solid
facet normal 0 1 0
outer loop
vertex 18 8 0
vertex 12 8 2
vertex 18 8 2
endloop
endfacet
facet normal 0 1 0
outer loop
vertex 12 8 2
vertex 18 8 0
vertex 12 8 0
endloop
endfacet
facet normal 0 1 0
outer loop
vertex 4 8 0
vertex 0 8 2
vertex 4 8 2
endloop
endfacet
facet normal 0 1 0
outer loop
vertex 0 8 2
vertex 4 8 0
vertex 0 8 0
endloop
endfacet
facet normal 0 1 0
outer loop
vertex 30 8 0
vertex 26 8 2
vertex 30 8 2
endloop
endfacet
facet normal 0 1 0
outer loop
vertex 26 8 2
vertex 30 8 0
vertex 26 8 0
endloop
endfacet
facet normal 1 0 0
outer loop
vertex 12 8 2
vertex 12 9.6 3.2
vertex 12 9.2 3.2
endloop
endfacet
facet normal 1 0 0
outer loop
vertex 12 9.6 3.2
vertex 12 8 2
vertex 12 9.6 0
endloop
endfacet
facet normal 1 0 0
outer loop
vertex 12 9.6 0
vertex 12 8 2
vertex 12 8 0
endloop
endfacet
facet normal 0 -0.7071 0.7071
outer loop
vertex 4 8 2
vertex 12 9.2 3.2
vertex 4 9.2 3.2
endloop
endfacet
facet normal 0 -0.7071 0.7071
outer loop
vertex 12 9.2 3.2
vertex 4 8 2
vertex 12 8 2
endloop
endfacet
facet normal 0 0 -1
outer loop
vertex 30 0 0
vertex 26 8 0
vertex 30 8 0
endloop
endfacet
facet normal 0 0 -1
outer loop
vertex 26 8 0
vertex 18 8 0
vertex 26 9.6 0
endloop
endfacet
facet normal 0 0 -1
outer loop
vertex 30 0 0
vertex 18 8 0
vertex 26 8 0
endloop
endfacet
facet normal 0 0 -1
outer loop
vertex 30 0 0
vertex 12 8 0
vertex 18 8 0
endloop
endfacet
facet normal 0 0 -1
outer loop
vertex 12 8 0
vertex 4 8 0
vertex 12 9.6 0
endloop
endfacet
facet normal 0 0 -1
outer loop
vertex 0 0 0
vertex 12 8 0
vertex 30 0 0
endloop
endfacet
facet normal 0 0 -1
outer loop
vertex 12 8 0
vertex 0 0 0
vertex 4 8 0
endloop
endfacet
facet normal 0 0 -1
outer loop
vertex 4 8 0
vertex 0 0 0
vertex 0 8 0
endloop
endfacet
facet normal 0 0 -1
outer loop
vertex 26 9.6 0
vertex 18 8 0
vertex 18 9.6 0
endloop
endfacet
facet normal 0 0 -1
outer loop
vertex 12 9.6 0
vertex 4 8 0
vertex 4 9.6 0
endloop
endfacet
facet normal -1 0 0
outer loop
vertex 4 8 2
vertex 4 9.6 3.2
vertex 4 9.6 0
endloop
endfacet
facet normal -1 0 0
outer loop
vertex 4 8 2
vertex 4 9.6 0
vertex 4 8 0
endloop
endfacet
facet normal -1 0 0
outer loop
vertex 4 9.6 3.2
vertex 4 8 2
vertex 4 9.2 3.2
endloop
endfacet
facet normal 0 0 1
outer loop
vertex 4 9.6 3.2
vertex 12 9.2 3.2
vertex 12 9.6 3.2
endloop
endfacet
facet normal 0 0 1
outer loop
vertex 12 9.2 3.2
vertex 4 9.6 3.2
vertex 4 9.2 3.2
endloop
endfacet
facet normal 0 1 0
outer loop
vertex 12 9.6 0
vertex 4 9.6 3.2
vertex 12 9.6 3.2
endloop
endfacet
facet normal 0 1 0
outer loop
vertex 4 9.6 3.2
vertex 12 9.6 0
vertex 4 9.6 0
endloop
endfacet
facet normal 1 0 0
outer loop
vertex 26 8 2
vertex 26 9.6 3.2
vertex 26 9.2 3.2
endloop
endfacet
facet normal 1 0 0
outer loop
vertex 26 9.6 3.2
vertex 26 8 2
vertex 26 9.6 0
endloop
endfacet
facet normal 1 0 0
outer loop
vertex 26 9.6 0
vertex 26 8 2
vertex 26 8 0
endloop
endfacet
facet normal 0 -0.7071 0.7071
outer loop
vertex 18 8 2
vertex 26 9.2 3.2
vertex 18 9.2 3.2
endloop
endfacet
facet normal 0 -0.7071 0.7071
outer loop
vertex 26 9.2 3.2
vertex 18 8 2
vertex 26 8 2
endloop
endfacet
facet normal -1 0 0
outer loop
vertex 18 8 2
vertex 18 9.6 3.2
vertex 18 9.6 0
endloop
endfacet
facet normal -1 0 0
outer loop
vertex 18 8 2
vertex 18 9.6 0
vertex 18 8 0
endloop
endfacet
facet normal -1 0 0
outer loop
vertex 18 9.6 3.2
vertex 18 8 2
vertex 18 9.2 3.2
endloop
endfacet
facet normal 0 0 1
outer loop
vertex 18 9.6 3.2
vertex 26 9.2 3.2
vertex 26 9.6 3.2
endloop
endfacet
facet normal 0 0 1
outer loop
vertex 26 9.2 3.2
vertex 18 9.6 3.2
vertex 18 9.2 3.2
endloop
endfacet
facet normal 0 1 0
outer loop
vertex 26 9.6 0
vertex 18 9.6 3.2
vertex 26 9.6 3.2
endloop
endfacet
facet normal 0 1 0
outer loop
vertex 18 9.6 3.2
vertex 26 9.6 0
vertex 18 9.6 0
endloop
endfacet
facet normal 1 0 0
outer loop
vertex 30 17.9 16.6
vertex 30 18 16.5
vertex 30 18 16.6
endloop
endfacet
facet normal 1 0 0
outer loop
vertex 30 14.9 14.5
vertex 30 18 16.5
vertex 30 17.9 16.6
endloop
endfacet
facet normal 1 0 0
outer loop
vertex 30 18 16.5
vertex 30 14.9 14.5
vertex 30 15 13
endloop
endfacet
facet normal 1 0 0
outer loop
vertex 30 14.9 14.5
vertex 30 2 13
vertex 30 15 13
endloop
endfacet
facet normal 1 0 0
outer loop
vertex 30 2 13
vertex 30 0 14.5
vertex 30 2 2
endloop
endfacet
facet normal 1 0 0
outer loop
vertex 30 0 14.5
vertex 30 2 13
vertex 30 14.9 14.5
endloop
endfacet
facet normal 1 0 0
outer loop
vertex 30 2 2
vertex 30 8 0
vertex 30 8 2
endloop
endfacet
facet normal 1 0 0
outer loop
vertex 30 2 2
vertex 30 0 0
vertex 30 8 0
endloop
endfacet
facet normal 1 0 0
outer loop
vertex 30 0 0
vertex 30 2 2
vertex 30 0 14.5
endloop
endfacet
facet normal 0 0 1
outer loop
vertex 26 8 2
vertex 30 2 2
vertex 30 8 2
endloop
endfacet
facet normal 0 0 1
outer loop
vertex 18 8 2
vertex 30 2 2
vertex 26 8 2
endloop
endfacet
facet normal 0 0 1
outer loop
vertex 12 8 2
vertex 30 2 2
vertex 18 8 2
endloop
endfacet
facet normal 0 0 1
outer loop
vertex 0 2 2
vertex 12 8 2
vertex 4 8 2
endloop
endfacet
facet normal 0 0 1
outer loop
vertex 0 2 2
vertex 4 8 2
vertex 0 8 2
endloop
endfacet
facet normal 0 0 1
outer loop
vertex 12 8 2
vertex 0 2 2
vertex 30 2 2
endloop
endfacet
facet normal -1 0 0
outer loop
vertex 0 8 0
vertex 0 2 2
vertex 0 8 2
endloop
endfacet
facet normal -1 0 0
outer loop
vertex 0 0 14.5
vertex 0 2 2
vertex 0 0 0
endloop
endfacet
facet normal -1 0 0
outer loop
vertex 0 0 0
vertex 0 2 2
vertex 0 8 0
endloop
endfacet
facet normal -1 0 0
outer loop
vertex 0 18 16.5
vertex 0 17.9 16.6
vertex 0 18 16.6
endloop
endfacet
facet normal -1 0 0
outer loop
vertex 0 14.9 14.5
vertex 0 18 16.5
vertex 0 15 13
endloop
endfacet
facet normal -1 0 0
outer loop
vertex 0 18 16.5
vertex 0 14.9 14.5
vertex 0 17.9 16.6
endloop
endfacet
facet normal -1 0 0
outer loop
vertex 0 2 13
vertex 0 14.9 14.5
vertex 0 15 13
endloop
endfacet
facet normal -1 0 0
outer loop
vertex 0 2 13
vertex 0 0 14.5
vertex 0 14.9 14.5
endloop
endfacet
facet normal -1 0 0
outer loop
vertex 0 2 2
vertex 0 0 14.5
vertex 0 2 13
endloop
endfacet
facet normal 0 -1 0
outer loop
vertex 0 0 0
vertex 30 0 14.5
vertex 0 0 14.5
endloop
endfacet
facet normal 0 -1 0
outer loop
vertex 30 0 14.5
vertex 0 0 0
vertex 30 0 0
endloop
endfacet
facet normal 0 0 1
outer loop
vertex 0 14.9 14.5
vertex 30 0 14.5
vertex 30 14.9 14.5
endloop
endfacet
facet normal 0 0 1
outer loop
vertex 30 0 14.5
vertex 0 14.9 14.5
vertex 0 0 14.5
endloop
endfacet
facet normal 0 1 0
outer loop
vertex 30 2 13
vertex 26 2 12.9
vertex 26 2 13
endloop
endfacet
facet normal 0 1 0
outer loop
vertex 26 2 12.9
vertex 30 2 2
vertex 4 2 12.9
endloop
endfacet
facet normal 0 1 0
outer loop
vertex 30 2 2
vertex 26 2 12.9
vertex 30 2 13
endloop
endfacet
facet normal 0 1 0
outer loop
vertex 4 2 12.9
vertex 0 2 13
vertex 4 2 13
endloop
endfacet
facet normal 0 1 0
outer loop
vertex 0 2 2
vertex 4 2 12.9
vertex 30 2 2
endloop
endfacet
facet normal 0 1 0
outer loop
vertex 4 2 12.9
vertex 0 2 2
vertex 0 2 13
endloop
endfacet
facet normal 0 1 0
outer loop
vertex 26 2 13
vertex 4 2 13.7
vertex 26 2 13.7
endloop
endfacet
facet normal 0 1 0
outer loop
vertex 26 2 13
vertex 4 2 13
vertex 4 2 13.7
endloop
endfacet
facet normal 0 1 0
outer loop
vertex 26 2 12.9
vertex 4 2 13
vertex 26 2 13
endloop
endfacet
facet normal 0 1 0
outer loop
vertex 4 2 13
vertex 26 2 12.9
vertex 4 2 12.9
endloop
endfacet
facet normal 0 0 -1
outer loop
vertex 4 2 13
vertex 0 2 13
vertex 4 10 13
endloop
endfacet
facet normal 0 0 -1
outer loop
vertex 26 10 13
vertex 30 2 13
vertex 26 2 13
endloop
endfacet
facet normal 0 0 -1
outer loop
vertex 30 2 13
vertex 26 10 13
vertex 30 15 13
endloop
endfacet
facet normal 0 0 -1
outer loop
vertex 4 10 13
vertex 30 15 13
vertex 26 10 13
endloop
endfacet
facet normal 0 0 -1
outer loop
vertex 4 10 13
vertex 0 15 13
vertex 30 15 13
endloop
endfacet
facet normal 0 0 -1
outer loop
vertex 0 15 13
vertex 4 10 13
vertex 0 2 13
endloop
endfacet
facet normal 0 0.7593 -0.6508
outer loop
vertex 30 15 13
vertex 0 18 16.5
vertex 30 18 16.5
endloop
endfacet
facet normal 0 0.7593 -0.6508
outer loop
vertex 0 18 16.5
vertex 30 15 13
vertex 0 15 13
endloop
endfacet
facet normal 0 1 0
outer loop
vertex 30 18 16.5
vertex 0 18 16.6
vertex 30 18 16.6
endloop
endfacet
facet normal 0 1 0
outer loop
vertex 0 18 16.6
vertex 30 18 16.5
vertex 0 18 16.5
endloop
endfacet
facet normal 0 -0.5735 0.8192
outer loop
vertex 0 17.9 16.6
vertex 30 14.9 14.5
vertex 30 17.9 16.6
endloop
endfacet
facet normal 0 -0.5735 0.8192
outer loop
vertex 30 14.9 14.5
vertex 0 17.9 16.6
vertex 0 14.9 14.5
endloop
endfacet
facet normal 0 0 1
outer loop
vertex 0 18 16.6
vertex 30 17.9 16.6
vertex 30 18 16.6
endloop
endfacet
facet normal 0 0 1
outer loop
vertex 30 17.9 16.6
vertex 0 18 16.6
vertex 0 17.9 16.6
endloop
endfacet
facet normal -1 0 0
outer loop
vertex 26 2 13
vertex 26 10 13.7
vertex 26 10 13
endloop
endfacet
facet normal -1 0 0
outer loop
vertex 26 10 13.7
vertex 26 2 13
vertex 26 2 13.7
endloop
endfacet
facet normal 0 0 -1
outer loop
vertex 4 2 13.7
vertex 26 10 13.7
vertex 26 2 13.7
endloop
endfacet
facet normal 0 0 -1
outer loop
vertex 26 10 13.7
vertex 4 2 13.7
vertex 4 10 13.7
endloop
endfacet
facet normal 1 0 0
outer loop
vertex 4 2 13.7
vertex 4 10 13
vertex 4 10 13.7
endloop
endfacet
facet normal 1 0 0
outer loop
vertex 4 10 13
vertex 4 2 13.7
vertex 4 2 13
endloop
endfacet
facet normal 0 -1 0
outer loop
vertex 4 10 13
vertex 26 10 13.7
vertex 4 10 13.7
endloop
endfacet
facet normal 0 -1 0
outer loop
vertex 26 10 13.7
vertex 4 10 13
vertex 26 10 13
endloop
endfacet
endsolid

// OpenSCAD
// ============================================================
// CLIP DE RETENÇÃO PARA MANTA G3
// Impressão 3D - PLA/PETG (Ender 3)
// ============================================================
//
// CONCEITO: Clips que prendem a manta G3 (10mm) na borda
// do furo 200×200mm do MDF da divisória.
//
// O clip abraça a borda do MDF (3mm) e tem uma aba que
// pressiona a manta contra o MDF. Para trocar a manta:
// aperta a lingueta flexível e puxa o clip.
//
// FIXAÇÃO: O clip tem 2 dentes snap-fit que passam por
// slots cortados no MDF na borda do furo.
//
// QUANTIDADE: 8 clips (2 por lado do furo)
//
// VISTA LATERAL (corte):
//
//   ┌── aba retenção (prensa manta) ──┐
//   │         manta G3 10mm           │
//   ╞═══MDF══[entalhe]════════════════╡  ← entalhe 30×2mm no MDF
//            │  base (sob o MDF)       │
//            └── dente ────── dente ───┘
//
// SEÇÃO DO CLIP:
//   Topo: aba 15mm sobre a manta (prensa para baixo)
//   Meio: parede (2mm) passa pelo entalhe na borda do furo
//   Base: 8mm por baixo do MDF com dentes snap-fit
//
// MONTAGEM:
//   1. Incline o clip pela abertura do furo
//   2. Deslize a base por baixo do MDF (área sólida)
//   3. A parede passa pelo entalhe 30×2mm na borda
//   4. Dentes clicam nos slots do MDF
//   5. Aba prensa a manta por cima
//
// ============================================================

// === PARÂMETROS ===
mdf = 3;            // Espessura MDF
folga = 0.3;        // Folga de encaixe
manta_esp = 10;     // Espessura da manta G3

// Clip
clip_larg = 30;     // Largura do clip ao longo da borda
clip_parede = 2;    // Espessura das paredes
aba_comp = 15;      // Comprimento da aba sobre a manta
aba_esp = 1.5;      // Espessura da aba (flexível, prensa a manta)
base_prof = 8;      // Profundidade da base por baixo do MDF

// Snap-fit
dente_h = 1.2;      // Altura do dente (entra no slot MDF)
dente_w = 8;        // Largura do dente
dente_pos1 = 7;     // Posição do dente 1 (distância do centro)
dente_pos2 = 7;     // Simétrico

// Slot no MDF (cortado CNC)
slot_w = 10;        // Largura do slot = dente_w + 2mm folga
slot_h = 2;         // Altura do slot = dente_h + folga
// 2 slots por clip, 8 clips = 16 slots no MDF

// Entalhe no MDF para parede do clip (CNC)
// Retângulo clip_larg × clip_parede na borda do furo
// 8 entalhes (1 por clip) — sem eles a parede colide com o MDF
entalhe_w    = clip_larg;   // 30mm (largura do clip)
entalhe_prof = clip_parede; // 2mm (espessura da parede)

// === MÓDULO PRINCIPAL ===
module clip_manta() {
    // O clip é orientado assim:
    // X = largura (30mm ao longo da borda)
    // Y = profundidade (base→aba)
    // Z = altura (de baixo do MDF para cima)
    //
    // Z=0 = face inferior do MDF
    // Z=mdf = face superior do MDF (onde a manta fica)
    // Z=mdf+manta_esp = topo da manta

    difference() {
        union() {
            // --- BASE (por baixo do MDF) ---
            // Placa que fica embaixo do MDF, segura o clip
            cube([clip_larg, base_prof, clip_parede]);
            
            // --- PAREDE VERTICAL (borda do furo) ---
            // Sobe pelo furo, abraçando a borda do MDF
            cube([clip_larg, clip_parede, mdf + manta_esp + aba_esp]);
            
            // --- ABA DE RETENÇÃO (sobre a manta) ---
            // Aba que prensa a manta contra o MDF
            // Posição: no topo da manta, avança sobre ela
            translate([0, 0, mdf + manta_esp])
                cube([clip_larg, aba_comp, aba_esp]);
            
            // --- RAMPA DE ENTRADA ---
            // Chanfro na ponta da aba para facilitar encaixe da manta
            translate([0, aba_comp - 0.1, mdf + manta_esp])
            hull() {
                cube([clip_larg, 0.1, aba_esp]);
                translate([0, 3, aba_esp + 2])
                    cube([clip_larg, 0.1, 0.1]);
            }
            
            // --- DENTES SNAP-FIT (2 por clip) ---
            // Sobem a partir da base para engatar nos slots do MDF
            translate([clip_larg/2 - dente_pos1 - dente_w/2, base_prof, 0])
                dente_snap();
            translate([clip_larg/2 + dente_pos2 - dente_w/2, base_prof, 0])
                dente_snap();
        }
        
        // --- CANAL de flexão na aba ---
        // Permite que a aba flexione para acomodar variação de espessura
        translate([clip_parede + 2, clip_parede, mdf + manta_esp - 0.1])
            cube([clip_larg - 2*clip_parede - 4, aba_comp - clip_parede - 5, 0.8]);
    }
}

// Dente snap-fit
module dente_snap() {
    // Rampa de entrada (facilita encaixe)
    hull() {
        cube([dente_w, 0.1, clip_parede]);
        translate([0, dente_h, 0])
            cube([dente_w, 0.1, clip_parede + dente_h]);
    }
    // Face de retenção (plana, trava no slot)
    translate([0, dente_h, 0])
        cube([dente_w, 0.4, clip_parede + dente_h]);
}

// === VISUALIZAÇÃO ===

// Clip orientado para impressão (base na mesa, Z=0)
clip_manta();

// MDF fantasma para referência visual
%translate([-5, -2, 0])
    cube([clip_larg + 10, base_prof + aba_comp + 10, mdf]);

// Manta fantasma
%translate([-5, -2, mdf])
    color("LimeGreen", 0.3)
        cube([clip_larg + 10, aba_comp + 10, manta_esp]);
